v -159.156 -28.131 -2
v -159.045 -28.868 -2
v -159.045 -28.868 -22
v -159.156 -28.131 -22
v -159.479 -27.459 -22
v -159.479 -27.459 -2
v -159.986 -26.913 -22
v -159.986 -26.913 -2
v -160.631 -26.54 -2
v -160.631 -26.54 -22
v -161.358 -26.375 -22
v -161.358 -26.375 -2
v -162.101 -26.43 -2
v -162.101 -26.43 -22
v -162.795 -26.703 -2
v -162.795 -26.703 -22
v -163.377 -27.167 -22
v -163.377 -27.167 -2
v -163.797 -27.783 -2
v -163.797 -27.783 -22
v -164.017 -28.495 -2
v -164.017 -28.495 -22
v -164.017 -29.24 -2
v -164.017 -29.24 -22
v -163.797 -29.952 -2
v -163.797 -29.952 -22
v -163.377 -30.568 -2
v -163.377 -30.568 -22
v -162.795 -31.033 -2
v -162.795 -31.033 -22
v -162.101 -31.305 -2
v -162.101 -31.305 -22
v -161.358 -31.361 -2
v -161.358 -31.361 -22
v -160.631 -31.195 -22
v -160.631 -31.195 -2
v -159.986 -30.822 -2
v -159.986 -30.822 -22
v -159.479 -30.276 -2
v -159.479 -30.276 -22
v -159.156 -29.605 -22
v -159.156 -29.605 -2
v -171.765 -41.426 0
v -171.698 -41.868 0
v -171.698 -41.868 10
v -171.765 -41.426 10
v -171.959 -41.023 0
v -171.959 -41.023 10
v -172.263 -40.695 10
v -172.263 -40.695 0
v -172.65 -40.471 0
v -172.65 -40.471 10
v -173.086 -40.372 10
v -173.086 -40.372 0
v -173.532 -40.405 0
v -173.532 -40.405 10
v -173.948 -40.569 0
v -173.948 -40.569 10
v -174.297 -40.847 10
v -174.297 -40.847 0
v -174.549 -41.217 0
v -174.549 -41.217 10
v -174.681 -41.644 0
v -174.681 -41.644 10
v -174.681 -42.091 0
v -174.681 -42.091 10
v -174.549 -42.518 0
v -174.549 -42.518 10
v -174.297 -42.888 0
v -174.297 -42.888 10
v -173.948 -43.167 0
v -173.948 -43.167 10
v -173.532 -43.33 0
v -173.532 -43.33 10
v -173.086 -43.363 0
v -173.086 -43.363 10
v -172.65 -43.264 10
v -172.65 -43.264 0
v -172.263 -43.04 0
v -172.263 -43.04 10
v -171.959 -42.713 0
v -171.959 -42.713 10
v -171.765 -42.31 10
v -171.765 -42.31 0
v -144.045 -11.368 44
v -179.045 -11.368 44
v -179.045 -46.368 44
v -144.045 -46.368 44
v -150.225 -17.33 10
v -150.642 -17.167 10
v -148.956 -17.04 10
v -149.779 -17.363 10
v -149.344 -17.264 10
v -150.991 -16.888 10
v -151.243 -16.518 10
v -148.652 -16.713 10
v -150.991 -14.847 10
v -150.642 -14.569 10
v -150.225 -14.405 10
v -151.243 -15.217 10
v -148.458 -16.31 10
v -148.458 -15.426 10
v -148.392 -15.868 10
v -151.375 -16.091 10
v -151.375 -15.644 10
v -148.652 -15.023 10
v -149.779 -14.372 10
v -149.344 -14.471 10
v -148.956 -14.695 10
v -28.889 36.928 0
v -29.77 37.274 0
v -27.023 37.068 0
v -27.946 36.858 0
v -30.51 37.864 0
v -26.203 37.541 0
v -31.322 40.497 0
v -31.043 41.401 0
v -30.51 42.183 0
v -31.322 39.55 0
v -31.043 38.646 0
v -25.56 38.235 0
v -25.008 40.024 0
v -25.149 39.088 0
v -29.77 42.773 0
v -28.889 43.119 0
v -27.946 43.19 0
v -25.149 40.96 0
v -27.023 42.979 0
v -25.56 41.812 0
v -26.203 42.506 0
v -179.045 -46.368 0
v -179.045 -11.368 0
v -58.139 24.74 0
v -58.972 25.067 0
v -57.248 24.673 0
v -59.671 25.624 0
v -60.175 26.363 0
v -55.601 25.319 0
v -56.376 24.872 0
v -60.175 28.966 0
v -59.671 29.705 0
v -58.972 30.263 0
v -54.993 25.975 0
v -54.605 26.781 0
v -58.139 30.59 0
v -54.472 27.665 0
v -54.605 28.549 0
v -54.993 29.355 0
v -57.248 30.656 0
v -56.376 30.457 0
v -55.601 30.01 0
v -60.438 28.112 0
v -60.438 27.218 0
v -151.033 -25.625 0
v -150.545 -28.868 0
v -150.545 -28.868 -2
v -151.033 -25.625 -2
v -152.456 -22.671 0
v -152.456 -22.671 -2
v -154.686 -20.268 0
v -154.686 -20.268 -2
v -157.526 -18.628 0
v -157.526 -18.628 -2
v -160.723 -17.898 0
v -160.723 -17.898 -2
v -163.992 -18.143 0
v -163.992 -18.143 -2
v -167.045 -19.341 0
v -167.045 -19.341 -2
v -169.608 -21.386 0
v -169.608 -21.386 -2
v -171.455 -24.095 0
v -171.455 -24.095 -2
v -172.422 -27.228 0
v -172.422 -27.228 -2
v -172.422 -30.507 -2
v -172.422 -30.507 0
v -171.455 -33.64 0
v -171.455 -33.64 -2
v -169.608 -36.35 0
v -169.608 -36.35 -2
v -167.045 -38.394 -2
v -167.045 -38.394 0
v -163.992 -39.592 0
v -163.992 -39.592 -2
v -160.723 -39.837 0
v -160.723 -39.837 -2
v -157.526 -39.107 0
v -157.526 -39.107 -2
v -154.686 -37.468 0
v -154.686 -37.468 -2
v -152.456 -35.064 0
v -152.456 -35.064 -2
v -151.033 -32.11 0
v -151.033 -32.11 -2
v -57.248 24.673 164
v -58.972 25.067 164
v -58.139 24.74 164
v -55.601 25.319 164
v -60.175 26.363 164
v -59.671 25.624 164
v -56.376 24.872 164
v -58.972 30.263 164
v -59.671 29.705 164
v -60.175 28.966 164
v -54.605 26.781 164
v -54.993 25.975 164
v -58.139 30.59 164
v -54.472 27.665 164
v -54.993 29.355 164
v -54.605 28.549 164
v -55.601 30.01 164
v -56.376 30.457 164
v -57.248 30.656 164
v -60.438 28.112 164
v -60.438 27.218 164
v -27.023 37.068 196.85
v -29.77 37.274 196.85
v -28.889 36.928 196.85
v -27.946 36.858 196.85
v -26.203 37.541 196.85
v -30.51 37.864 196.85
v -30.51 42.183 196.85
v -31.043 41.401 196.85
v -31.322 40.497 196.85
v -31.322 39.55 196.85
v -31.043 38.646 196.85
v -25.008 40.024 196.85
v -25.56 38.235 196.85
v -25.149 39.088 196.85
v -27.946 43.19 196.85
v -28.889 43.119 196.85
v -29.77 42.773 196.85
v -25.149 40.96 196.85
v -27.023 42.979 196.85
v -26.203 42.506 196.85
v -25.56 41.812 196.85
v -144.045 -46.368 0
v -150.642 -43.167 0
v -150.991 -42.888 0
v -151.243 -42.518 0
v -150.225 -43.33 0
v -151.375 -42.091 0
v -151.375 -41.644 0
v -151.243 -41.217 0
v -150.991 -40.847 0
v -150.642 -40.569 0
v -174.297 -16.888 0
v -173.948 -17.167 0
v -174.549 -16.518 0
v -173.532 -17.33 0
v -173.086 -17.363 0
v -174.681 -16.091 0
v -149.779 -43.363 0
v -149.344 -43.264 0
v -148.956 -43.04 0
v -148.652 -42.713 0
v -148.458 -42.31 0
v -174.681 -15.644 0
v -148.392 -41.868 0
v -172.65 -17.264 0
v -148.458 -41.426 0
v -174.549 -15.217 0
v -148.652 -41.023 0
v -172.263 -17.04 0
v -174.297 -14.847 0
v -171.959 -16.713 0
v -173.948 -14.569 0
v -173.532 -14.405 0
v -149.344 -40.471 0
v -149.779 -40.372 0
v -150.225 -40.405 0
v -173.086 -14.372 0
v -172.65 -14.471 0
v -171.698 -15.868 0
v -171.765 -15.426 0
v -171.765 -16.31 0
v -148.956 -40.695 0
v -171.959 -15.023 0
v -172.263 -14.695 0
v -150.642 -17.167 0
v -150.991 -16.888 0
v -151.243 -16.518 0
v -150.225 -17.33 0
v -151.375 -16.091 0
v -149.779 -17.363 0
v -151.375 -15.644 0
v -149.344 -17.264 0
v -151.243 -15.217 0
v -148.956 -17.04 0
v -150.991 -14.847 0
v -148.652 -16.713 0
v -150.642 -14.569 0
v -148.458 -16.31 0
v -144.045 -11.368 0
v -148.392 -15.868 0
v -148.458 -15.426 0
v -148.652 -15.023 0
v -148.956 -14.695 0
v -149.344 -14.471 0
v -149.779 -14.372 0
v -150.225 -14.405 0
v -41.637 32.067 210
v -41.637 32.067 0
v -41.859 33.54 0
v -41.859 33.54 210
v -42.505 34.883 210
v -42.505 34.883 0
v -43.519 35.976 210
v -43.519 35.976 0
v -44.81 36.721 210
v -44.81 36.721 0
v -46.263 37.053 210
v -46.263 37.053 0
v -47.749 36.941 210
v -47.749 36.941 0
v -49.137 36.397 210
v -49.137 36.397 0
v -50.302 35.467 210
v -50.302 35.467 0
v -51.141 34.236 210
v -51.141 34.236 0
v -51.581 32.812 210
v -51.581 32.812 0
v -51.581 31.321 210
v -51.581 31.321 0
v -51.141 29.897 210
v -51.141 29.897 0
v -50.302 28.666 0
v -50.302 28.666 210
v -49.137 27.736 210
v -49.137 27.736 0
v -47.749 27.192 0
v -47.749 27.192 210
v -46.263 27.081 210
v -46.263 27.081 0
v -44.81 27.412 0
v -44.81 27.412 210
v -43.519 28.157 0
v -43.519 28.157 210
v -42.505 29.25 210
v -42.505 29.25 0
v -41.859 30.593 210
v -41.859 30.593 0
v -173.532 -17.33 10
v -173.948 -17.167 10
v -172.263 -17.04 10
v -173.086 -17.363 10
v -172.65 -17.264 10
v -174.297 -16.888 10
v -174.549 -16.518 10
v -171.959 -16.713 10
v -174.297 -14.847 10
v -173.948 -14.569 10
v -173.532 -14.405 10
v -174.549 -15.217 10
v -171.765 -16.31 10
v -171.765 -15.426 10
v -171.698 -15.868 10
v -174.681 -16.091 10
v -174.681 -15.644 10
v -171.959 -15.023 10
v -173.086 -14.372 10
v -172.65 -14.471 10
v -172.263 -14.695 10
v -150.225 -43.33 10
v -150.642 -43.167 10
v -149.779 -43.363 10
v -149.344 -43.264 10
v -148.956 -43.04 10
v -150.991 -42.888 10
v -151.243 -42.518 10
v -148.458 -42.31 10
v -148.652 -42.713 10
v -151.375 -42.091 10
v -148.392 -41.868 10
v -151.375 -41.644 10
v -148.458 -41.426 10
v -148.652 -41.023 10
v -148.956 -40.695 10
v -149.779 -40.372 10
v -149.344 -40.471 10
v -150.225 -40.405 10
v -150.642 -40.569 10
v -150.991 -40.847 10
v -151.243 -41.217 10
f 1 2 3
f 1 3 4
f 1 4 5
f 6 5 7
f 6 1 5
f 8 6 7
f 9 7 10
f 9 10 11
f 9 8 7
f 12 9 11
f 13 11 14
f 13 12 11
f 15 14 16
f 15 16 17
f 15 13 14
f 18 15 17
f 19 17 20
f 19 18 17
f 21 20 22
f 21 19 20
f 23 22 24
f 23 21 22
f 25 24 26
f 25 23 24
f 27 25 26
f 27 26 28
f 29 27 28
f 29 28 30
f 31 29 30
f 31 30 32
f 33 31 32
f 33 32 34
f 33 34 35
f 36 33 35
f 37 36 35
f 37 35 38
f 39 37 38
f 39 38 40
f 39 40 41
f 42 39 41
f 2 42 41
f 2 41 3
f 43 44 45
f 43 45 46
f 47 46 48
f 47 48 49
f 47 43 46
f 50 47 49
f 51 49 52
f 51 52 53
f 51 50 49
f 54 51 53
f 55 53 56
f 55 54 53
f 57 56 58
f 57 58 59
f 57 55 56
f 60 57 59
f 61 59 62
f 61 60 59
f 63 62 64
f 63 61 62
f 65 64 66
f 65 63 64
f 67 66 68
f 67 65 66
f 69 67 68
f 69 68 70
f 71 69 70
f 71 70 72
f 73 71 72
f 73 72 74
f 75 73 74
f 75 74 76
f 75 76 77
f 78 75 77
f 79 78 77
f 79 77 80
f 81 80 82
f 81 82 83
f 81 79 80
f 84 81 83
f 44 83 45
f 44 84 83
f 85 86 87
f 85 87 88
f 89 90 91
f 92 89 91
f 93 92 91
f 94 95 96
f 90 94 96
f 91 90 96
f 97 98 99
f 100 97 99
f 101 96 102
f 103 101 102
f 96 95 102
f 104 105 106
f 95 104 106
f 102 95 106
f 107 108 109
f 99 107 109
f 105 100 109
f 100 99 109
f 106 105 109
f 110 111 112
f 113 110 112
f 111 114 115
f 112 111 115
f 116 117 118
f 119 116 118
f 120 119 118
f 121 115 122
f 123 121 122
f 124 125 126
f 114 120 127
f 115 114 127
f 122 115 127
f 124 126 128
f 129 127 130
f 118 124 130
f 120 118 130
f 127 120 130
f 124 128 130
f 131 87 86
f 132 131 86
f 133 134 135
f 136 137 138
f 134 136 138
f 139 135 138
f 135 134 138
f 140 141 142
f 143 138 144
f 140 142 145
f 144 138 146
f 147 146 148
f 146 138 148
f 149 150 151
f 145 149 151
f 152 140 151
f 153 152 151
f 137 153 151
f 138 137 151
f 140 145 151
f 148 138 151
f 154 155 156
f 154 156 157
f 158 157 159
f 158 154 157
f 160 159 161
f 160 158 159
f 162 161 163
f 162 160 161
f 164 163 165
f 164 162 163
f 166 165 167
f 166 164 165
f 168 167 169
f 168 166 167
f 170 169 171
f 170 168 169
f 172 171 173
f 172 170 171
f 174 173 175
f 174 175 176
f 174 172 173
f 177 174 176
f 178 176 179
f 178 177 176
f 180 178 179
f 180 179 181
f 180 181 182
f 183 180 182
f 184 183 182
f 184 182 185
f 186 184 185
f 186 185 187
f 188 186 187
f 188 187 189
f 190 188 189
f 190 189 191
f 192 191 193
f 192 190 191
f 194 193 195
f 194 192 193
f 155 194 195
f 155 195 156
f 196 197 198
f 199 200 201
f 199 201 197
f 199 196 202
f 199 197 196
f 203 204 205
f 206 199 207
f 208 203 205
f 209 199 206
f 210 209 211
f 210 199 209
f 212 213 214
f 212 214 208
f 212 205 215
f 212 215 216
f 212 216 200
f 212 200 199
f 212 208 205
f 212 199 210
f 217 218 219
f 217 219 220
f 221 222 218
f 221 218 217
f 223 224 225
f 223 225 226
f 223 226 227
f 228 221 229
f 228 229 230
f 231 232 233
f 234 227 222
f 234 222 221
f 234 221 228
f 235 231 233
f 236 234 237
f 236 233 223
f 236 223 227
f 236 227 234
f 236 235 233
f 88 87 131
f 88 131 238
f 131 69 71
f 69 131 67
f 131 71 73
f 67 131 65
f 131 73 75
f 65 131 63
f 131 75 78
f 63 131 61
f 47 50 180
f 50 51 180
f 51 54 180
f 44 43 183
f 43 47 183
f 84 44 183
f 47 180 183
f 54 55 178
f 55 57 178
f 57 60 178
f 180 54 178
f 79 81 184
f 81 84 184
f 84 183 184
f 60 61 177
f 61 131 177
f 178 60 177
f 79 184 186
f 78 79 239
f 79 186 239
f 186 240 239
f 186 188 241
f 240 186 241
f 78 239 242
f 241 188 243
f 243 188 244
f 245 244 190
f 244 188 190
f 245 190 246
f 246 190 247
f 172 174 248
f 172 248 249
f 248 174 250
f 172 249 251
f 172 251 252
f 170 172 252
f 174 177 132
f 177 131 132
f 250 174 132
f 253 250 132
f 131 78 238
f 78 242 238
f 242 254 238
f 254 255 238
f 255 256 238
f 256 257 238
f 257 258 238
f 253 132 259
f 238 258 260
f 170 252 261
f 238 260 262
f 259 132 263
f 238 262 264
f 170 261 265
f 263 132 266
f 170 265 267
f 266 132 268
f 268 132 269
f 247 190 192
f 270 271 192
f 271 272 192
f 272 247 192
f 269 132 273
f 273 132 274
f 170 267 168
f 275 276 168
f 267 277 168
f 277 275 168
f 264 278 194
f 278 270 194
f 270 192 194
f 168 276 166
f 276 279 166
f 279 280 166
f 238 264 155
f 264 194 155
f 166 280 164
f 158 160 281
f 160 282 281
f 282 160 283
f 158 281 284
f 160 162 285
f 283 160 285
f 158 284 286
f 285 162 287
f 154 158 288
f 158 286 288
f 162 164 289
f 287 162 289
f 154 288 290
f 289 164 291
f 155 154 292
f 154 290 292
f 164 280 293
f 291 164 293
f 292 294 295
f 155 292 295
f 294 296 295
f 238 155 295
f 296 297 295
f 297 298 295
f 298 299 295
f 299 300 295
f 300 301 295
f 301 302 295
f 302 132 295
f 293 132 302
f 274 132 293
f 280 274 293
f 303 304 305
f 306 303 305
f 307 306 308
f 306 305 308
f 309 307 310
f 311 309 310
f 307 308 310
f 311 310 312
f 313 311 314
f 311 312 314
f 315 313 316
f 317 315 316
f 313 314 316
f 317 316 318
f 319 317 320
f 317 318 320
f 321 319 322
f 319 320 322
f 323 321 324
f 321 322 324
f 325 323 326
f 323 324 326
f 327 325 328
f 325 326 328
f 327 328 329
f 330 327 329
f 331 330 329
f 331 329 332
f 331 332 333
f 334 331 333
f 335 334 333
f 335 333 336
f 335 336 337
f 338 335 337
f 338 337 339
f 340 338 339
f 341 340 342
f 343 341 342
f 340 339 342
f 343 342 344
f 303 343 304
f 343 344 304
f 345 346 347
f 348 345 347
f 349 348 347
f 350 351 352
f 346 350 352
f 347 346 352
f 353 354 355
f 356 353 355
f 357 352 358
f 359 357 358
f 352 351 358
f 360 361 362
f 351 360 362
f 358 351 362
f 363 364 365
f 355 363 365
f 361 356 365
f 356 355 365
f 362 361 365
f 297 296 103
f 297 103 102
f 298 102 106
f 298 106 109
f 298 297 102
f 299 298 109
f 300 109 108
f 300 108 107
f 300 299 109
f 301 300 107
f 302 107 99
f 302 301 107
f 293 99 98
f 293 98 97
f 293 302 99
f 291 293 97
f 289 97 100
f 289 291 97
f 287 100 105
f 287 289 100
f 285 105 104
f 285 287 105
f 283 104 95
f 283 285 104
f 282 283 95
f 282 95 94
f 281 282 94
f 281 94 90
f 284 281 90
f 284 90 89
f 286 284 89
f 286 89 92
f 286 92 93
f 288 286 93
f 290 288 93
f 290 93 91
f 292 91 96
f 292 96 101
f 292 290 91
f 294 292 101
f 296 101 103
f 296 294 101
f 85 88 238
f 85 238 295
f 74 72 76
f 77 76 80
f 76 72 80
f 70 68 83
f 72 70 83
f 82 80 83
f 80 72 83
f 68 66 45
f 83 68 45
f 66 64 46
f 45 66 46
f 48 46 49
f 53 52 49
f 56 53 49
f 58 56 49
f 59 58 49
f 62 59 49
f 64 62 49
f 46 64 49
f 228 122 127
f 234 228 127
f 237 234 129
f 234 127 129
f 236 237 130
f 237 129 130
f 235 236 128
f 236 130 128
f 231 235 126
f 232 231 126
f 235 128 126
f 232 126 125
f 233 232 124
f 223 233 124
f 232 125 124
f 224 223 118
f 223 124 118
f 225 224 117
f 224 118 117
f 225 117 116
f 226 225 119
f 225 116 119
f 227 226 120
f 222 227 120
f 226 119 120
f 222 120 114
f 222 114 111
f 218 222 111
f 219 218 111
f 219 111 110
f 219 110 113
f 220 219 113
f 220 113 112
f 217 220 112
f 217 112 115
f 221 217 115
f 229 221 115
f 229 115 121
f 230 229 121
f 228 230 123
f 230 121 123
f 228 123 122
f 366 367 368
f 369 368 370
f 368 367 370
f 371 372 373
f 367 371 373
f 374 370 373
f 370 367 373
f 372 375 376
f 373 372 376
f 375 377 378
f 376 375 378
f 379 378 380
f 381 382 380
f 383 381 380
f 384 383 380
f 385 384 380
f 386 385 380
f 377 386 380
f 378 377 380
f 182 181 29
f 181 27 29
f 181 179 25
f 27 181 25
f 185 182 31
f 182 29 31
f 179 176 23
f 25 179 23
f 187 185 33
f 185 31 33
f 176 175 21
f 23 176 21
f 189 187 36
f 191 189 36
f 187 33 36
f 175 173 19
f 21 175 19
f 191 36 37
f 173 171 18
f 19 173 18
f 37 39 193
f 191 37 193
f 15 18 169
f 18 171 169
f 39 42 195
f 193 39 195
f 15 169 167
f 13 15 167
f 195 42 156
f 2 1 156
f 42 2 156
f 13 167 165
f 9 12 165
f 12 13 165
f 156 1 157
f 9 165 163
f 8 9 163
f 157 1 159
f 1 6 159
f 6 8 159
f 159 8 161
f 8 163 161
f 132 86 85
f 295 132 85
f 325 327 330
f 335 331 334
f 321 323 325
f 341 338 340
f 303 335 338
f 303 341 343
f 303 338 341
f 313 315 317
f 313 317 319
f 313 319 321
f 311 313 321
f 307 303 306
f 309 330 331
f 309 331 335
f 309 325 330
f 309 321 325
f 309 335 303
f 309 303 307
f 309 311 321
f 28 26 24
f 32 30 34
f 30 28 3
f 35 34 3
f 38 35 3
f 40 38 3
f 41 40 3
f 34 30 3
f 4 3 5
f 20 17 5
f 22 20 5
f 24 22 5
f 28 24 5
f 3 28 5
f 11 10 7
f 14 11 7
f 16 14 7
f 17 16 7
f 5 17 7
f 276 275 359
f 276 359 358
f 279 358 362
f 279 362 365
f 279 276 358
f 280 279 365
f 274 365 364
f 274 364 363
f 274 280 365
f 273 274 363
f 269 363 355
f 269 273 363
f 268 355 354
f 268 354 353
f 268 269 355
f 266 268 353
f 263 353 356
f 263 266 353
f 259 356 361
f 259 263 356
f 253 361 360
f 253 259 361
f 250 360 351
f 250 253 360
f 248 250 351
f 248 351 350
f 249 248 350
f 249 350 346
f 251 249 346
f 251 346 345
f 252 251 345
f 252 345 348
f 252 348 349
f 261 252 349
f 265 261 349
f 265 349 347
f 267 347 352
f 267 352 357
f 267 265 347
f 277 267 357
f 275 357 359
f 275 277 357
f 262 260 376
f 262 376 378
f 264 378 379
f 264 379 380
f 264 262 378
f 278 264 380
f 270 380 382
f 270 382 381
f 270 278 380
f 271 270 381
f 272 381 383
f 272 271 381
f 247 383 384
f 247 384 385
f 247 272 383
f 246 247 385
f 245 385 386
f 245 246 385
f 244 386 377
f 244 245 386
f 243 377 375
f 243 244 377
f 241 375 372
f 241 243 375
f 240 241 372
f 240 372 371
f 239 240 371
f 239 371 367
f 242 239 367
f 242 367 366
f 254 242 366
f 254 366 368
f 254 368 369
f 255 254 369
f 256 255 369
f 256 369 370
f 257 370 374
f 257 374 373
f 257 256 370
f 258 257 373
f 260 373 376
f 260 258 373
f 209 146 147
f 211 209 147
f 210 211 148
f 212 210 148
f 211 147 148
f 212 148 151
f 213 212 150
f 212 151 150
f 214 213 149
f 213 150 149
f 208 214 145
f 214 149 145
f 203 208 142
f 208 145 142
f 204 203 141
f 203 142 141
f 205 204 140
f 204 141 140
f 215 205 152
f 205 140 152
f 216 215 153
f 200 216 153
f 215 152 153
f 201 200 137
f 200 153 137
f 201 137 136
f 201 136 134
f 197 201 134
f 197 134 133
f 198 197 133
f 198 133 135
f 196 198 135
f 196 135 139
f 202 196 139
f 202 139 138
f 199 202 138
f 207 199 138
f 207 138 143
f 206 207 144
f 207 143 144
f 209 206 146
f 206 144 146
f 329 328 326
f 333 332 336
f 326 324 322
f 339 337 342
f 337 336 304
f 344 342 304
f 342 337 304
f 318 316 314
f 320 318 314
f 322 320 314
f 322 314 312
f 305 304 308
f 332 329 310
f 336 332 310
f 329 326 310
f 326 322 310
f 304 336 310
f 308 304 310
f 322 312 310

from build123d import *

# Parameters (mm, degrees)
F0_R     = 3
F1_DEPTH = 164
F0_R_2   = 5
F2_DEPTH = 210
F0_R_3   = 3.175
F3_DEPTH = 196.85
F0_W     = 35
F0_H     = 35
F0_R_4   = 1.5
F0_R_5   = 11
F0_R_6   = 2.5
F4_DEPTH = 44
F5_DEPTH = 2
F6_DEPTH = 10
F7_DEPTH = 22


with BuildPart() as f1:
    # F0 (on Top) → F1 (new body)
    with BuildSketch(Plane.XY):
        with Locations((-57.471775, 27.66481)):
            Circle(F0_R)
    extrude(amount=F1_DEPTH)


with BuildPart() as f2:
    # F0 (on Top) → F2 (new body)
    with BuildSketch(Plane.XY):
        with Locations((-46.636587, 32.066606)):
            Circle(F0_R_2)
    extrude(amount=F2_DEPTH)


with BuildPart() as f3:
    # F0 (on Top) → F3 (new body)
    with BuildSketch(Plane.XY):
        with Locations((-28.182909, 40.023697)):
            Circle(F0_R_3)
    extrude(amount=F3_DEPTH)


with BuildPart() as f4:
    # F0 (on Top) → F4 (new body)
    with BuildSketch(Plane.XY):
        with Locations((-161.544724, -28.86765)):
            Rectangle(F0_W, F0_H)
        with Locations((-173.197865, -41.86765)):
            Circle(F0_R_4, mode=Mode.SUBTRACT)
        with Locations((-149.891582, -41.86765)):
            Circle(F0_R_4, mode=Mode.SUBTRACT)
        with Locations((-161.544724, -28.86765)):
            Circle(F0_R_5, mode=Mode.SUBTRACT)
        with Locations((-173.197865, -15.86765)):
            Circle(F0_R_4, mode=Mode.SUBTRACT)
        with Locations((-149.891582, -15.86765)):
            Circle(F0_R_4, mode=Mode.SUBTRACT)
        with Locations((-161.544724, -28.86765)):
            Circle(F0_R_5)
        with Locations((-161.544724, -28.86765)):
            Circle(F0_R_6, mode=Mode.SUBTRACT)
        with Locations((-161.544724, -28.86765)):
            Circle(F0_R_6)
        with Locations((-149.891582, -41.86765)):
            Circle(F0_R_4)
        with Locations((-173.197865, -41.86765)):
            Circle(F0_R_4)
        with Locations((-173.197865, -15.86765)):
            Circle(F0_R_4)
        with Locations((-149.891582, -15.86765)):
            Circle(F0_R_4)
    extrude(amount=F4_DEPTH)

    # F0 (on Top) → F5 (join)
    with BuildSketch(Plane.XY):
        with Locations((-161.544724, -28.86765)):
            Circle(F0_R_5)
        with Locations((-161.544724, -28.86765)):
            Circle(F0_R_6, mode=Mode.SUBTRACT)
        with Locations((-161.544724, -28.86765)):
            Circle(F0_R_6)
    extrude(amount=-F5_DEPTH)

    # F0 (on Top) → F6 (cut)
    with BuildSketch(Plane.XY):
        with Locations((-173.197865, -41.86765)):
            Circle(F0_R_4)
        with Locations((-149.891582, -41.86765)):
            Circle(F0_R_4)
        with Locations((-149.891582, -15.86765)):
            Circle(F0_R_4)
        with Locations((-173.197865, -15.86765)):
            Circle(F0_R_4)
    extrude(amount=F6_DEPTH, mode=Mode.SUBTRACT)

    # F0 (on Top) → F7 (join)
    with BuildSketch(Plane.XY):
        with Locations((-161.544724, -28.86765)):
            Circle(F0_R_6)
    extrude(amount=-F7_DEPTH)


solid = Compound([f1.part, f2.part, f3.part, f4.part])
